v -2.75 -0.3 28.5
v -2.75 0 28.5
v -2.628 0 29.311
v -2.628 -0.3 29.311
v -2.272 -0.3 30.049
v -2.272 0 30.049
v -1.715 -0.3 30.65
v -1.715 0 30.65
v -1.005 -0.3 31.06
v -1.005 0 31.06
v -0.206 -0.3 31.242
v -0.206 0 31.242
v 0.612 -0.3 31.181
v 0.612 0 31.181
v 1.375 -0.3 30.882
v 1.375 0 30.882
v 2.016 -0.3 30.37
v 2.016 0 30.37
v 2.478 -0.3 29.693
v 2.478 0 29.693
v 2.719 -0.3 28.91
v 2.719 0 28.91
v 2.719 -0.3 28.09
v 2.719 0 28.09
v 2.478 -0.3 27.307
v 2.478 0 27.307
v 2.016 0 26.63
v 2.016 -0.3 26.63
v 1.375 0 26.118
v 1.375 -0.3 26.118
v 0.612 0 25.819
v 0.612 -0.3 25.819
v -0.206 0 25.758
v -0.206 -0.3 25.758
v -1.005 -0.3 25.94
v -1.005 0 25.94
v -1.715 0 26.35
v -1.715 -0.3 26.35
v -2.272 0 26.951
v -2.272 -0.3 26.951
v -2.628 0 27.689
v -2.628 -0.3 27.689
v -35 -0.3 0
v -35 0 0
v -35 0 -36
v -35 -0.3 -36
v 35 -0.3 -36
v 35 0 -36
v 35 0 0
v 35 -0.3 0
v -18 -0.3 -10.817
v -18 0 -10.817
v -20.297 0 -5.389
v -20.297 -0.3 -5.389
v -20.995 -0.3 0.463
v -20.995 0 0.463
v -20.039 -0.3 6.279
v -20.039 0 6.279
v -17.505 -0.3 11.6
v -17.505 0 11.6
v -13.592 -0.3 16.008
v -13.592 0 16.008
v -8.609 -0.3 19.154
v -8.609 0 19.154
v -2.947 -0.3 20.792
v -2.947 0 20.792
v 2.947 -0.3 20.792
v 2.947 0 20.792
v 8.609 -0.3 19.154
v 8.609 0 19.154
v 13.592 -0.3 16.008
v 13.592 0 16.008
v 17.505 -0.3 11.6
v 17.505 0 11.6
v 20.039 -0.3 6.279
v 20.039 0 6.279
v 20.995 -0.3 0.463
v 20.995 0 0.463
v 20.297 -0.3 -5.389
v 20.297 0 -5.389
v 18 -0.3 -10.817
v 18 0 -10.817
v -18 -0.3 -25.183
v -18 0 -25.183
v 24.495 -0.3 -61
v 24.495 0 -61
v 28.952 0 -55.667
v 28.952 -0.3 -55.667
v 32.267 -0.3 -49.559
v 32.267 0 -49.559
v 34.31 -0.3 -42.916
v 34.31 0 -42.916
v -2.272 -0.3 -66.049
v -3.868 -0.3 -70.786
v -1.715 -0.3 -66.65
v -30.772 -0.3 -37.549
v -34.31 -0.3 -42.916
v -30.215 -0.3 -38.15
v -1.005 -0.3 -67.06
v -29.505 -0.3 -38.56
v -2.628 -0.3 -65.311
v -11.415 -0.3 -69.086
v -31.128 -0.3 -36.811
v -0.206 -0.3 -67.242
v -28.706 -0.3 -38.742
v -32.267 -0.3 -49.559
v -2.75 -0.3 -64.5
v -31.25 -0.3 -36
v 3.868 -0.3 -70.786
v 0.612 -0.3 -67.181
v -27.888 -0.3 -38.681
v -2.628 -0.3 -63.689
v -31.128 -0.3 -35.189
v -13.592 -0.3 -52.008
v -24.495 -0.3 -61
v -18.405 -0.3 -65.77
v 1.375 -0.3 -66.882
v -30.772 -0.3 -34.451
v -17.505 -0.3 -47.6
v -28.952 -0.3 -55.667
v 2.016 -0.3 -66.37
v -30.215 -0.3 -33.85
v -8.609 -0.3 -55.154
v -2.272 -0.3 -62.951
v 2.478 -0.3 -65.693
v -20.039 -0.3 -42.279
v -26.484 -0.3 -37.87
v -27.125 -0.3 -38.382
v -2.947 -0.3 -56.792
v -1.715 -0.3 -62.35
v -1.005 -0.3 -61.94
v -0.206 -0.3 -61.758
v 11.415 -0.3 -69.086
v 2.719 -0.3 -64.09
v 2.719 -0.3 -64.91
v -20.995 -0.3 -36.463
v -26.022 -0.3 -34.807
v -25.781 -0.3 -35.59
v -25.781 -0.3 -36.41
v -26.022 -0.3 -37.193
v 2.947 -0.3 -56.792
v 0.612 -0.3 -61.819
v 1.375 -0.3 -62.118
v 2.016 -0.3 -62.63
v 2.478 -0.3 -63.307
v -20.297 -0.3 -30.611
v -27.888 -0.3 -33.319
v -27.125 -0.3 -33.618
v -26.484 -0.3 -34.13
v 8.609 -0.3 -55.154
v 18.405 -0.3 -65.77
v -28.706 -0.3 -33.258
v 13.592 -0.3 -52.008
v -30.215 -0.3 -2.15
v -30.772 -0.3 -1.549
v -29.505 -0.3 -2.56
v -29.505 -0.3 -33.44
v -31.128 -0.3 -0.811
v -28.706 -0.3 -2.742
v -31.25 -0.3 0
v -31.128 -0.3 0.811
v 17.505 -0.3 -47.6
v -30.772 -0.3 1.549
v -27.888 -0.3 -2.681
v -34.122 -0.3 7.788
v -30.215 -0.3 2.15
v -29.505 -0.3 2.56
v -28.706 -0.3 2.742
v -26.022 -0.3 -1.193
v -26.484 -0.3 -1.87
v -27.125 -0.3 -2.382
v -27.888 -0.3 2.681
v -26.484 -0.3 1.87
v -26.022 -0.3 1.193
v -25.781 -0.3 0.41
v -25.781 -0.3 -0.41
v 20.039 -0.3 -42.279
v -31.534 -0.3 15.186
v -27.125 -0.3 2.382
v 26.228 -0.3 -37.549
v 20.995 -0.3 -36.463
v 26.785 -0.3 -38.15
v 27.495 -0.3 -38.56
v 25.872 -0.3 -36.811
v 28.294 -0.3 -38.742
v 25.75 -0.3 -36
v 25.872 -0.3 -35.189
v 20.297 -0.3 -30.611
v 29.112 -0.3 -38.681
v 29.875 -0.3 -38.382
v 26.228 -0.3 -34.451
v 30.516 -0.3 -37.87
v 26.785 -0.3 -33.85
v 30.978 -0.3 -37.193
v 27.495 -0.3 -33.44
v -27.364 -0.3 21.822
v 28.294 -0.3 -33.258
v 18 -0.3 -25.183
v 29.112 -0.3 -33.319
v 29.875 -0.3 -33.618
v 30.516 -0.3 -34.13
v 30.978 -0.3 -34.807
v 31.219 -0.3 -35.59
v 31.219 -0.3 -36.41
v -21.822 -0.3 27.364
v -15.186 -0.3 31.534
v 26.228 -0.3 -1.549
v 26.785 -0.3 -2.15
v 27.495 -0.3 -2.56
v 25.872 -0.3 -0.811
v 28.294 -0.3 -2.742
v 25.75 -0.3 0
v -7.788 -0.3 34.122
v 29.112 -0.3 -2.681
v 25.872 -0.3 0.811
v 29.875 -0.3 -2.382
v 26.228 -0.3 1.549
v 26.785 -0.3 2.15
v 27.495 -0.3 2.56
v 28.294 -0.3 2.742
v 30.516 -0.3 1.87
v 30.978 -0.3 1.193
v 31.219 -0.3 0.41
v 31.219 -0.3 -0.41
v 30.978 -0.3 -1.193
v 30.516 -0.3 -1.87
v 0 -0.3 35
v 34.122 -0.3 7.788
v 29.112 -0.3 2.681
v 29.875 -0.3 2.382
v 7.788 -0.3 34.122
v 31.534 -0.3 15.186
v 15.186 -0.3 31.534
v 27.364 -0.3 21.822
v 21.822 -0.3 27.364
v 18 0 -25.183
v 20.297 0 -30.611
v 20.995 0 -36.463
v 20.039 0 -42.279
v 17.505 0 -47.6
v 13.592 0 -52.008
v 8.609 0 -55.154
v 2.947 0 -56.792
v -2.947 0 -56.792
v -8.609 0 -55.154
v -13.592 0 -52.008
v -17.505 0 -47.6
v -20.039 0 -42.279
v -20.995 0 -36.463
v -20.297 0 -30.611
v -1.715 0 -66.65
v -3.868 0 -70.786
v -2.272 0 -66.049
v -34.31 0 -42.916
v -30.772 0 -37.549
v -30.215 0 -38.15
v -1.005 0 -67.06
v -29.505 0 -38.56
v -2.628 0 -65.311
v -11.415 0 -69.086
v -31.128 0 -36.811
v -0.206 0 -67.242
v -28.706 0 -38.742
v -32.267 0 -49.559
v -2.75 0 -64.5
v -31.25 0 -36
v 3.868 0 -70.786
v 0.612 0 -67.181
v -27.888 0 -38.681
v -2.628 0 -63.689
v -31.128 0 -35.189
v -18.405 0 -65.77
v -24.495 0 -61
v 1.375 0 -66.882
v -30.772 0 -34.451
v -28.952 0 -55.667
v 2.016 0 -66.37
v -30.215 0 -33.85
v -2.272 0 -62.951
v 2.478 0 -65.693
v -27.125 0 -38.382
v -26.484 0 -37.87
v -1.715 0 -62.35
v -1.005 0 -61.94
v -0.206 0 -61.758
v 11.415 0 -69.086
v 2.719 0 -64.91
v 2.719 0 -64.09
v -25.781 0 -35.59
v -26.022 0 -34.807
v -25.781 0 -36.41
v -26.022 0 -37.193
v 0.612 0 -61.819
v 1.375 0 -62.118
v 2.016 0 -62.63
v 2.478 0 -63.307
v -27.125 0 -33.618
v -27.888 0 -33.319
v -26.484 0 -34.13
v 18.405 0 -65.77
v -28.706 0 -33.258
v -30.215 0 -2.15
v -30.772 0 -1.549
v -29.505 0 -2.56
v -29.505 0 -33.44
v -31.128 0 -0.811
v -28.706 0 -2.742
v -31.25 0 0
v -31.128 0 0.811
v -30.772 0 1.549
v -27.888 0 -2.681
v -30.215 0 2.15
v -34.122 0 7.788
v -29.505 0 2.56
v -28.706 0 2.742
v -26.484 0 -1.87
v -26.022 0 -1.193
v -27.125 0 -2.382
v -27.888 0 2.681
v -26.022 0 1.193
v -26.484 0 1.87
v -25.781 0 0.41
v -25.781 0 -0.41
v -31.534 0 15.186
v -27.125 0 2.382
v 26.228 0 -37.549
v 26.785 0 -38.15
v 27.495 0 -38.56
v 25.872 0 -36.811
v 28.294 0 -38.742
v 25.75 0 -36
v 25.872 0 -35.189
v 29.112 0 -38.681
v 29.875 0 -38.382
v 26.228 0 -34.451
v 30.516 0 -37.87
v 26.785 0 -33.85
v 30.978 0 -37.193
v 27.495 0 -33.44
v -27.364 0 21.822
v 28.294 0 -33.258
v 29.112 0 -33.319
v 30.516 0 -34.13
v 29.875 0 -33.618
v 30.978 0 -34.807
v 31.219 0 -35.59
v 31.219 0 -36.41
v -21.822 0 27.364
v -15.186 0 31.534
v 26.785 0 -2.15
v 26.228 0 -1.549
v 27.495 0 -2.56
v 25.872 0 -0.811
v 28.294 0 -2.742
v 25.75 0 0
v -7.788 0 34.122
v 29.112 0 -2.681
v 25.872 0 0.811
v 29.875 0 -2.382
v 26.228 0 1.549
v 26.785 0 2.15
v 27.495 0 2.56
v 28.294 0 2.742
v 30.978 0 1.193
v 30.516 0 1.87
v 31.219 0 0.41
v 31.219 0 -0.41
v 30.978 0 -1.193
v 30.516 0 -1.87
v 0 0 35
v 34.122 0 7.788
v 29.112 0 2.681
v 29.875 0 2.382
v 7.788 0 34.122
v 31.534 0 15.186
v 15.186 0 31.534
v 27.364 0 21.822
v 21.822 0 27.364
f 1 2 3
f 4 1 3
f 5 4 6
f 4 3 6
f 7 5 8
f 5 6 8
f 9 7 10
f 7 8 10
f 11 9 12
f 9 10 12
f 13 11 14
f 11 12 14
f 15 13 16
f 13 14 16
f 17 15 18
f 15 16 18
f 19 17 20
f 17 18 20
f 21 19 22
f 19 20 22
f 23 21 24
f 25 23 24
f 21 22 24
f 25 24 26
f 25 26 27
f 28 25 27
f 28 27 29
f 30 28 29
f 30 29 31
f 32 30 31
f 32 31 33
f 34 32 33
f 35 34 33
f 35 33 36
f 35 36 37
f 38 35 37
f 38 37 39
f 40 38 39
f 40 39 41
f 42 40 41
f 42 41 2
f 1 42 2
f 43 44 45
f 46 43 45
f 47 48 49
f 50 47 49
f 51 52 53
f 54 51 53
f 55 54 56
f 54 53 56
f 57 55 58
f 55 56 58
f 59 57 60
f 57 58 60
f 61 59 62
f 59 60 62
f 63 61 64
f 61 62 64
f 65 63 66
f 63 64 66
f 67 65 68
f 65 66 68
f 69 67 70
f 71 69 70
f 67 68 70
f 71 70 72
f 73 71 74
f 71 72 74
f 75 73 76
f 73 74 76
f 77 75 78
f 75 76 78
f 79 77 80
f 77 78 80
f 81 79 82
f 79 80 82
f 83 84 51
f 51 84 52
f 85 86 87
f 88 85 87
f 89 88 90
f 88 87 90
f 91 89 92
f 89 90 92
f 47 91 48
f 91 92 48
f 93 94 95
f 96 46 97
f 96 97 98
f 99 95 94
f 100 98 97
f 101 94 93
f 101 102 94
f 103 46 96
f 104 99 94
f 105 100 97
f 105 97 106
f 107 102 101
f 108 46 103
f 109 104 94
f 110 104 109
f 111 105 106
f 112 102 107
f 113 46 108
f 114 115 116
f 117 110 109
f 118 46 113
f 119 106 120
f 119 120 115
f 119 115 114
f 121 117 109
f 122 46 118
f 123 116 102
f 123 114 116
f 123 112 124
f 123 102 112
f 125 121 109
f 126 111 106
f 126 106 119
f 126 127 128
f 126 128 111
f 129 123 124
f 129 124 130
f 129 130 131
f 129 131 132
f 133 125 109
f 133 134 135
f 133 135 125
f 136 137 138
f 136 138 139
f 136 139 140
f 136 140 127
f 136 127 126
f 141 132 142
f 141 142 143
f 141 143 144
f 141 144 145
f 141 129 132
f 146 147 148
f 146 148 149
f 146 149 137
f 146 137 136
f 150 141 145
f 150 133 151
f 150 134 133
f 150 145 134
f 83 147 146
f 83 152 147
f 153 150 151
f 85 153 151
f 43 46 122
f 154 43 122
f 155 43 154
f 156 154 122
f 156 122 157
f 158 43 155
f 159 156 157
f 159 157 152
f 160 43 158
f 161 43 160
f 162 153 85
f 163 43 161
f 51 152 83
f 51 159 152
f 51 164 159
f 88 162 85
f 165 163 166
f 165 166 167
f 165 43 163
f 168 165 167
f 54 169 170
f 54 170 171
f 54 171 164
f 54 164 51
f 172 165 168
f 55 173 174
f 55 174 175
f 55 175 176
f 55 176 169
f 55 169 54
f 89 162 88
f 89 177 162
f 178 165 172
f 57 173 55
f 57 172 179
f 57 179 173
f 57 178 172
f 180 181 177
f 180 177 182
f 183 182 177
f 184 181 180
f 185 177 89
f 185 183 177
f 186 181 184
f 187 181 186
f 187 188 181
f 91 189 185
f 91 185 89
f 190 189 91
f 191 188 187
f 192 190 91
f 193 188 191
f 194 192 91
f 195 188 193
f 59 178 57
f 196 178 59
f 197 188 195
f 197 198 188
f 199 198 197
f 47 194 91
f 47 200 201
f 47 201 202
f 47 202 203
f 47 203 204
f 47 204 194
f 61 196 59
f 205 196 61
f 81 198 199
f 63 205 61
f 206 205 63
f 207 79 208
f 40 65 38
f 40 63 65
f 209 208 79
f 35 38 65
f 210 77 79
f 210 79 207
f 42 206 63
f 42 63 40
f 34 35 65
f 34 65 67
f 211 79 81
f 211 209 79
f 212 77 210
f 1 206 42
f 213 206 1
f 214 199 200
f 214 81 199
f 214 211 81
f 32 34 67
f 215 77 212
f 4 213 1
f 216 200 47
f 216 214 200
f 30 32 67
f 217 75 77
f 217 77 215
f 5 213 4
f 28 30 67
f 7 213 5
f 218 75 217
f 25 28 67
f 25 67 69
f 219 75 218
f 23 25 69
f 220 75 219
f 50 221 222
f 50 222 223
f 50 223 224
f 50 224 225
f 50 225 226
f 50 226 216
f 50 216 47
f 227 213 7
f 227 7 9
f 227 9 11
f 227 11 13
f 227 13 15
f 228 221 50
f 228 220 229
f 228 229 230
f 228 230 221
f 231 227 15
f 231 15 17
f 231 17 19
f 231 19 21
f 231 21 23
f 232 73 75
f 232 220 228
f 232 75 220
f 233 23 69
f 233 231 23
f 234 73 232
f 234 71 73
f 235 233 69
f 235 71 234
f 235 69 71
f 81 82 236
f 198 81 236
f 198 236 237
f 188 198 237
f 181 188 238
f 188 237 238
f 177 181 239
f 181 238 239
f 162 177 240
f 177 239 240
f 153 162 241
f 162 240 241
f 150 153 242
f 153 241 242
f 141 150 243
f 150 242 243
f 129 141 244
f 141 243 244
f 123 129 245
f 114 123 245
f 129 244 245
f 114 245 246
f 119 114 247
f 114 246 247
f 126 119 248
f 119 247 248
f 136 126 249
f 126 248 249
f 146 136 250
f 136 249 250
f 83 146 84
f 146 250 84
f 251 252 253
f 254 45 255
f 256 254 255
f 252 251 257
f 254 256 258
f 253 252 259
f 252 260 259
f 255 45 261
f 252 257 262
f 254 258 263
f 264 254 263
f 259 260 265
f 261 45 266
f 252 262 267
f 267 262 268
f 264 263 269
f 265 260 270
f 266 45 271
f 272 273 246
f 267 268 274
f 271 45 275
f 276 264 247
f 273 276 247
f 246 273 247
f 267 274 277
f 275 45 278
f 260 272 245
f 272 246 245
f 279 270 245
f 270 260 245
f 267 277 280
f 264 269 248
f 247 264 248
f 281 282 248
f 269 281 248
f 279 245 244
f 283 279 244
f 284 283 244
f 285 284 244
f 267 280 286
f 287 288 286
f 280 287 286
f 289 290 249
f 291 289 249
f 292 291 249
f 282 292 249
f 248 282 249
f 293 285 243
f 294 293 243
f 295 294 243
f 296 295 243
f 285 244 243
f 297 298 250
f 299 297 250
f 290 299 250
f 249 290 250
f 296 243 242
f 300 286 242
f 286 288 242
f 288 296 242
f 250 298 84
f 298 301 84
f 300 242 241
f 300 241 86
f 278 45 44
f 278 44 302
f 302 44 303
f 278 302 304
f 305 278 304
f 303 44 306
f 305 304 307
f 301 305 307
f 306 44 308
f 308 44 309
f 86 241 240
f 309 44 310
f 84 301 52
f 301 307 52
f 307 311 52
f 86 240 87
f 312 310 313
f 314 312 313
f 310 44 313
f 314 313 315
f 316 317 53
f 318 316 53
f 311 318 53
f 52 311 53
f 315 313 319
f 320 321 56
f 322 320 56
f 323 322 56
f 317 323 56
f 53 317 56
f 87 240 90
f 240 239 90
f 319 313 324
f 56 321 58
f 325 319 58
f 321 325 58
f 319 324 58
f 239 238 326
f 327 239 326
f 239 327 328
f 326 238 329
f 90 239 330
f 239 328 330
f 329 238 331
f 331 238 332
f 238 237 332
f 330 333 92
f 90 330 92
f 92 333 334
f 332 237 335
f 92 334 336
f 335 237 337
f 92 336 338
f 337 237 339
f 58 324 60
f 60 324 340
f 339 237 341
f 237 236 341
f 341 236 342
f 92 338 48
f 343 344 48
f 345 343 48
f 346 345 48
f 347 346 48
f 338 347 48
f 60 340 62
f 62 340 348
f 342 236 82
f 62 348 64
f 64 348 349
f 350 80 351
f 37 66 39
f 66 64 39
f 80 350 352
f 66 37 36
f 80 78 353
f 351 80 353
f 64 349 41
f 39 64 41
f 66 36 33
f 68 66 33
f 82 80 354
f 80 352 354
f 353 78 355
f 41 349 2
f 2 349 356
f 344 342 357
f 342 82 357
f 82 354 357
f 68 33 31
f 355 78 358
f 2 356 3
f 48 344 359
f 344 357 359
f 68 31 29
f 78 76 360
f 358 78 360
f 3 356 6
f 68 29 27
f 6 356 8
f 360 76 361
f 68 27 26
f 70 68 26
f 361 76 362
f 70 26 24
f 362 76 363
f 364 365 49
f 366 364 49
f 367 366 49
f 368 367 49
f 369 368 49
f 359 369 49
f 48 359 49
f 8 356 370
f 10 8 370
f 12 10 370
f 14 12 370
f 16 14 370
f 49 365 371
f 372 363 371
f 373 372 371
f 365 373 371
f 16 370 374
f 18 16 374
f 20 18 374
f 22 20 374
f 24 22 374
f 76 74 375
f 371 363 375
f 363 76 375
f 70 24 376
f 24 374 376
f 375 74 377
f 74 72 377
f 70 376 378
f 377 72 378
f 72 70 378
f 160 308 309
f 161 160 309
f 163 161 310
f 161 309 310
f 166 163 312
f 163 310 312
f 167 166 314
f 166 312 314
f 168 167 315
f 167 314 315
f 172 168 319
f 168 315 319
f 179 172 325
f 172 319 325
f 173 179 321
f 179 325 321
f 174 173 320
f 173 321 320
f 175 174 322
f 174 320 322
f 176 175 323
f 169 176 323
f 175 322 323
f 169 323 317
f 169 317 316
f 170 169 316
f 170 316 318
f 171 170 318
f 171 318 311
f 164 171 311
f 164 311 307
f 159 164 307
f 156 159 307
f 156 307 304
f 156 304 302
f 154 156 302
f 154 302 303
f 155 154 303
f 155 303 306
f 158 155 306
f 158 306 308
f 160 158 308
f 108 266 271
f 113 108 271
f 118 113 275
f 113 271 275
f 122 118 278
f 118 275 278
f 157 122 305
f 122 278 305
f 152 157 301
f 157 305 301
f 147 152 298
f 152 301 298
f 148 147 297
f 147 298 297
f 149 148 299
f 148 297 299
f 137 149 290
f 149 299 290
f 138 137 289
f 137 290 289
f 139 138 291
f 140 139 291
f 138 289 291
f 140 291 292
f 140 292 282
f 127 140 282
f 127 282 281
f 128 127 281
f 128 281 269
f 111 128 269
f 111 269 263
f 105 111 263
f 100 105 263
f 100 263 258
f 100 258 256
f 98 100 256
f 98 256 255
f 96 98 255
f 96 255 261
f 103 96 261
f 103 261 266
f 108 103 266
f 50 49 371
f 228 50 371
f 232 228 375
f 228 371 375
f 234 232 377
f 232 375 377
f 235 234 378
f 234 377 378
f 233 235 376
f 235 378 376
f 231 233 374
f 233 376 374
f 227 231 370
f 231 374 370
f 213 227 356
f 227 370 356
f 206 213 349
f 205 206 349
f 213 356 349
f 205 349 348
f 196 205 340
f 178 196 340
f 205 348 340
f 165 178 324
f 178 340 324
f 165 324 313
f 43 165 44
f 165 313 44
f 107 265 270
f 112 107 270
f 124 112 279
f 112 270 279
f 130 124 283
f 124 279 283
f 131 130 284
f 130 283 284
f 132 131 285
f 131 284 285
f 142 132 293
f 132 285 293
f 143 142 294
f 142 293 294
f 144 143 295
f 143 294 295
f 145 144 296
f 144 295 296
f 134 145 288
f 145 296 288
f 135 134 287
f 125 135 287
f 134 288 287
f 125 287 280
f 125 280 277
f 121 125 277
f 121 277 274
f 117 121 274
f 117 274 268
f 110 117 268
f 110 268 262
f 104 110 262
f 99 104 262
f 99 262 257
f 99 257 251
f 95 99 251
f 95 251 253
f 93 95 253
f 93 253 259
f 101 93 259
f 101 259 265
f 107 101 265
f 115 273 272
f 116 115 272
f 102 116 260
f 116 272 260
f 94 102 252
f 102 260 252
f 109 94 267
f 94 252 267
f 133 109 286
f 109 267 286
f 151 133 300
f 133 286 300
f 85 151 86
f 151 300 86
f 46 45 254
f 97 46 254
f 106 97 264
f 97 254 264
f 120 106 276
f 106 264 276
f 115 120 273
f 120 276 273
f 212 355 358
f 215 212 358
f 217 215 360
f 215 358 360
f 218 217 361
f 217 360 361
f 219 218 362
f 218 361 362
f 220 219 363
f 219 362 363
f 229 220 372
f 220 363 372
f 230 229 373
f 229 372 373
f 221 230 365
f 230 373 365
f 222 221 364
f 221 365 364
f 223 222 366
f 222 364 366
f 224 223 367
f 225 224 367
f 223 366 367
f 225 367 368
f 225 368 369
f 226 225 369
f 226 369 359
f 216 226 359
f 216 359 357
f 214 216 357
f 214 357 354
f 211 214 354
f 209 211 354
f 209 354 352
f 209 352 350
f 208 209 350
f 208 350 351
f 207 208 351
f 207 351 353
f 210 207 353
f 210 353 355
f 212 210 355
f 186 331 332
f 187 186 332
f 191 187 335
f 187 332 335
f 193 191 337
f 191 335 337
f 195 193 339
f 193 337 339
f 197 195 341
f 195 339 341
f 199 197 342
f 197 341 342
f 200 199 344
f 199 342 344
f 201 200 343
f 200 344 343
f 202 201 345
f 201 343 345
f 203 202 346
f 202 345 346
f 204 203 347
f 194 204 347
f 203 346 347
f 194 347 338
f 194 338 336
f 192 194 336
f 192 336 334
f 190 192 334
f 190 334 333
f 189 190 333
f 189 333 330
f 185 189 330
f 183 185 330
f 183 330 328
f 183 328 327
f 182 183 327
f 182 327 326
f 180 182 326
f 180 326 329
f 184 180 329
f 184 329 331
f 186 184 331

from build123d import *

# Parameters (mm, degrees)
F1_DEPTH = 0.3
F3_D     = 5.5


with BuildPart() as f1:
    # F0 (on Front) → F1 (new body)
    with BuildSketch(Plane.XZ):
        with BuildLine():
            ThreePointArc((24.494897, -61), (32.267022, -49.558735), (35, -36))
            Line((35, -36), (35, -25.483315))
            Line((35, -25.483315), (35, -18))
            Line((35, -18), (35, -10.516685))
            Line((35, -10.516685), (35, 0))
            ThreePointArc((35, 0), (0, 35), (-35, 0))
            Line((-35, 0), (-35, -10.516685))
            Line((-35, -10.516685), (-35, -18))
            Line((-35, -18), (-35, -25.483315))
            Line((-35, -25.483315), (-35, -36))
            ThreePointArc((-35, -36), (-32.267022, -49.558735), (-24.494897, -61))
            ThreePointArc((-24.494897, -61), (0, -71), (24.494897, -61))
        make_face()
        with BuildLine():
            Line((-18, -25.183346), (-18, -10.816654))
            ThreePointArc((-18, -10.816654), (0, 21), (18, -10.816654))
            Line((18, -10.816654), (18, -25.183346))
            ThreePointArc((18, -25.183346), (0, -57), (-18, -25.183346))
        make_face(mode=Mode.SUBTRACT)
    extrude(amount=F1_DEPTH)

    # F3 (through all)
    with Locations(Plane.XZ.offset(0.3)):
        with Locations((0, 28.5), (-28.5, 0), (-28.5, -36), (0, -64.5), (28.5, -36), (28.5, 0)):
            Hole(F3_D / 2)


solid = f1.part
